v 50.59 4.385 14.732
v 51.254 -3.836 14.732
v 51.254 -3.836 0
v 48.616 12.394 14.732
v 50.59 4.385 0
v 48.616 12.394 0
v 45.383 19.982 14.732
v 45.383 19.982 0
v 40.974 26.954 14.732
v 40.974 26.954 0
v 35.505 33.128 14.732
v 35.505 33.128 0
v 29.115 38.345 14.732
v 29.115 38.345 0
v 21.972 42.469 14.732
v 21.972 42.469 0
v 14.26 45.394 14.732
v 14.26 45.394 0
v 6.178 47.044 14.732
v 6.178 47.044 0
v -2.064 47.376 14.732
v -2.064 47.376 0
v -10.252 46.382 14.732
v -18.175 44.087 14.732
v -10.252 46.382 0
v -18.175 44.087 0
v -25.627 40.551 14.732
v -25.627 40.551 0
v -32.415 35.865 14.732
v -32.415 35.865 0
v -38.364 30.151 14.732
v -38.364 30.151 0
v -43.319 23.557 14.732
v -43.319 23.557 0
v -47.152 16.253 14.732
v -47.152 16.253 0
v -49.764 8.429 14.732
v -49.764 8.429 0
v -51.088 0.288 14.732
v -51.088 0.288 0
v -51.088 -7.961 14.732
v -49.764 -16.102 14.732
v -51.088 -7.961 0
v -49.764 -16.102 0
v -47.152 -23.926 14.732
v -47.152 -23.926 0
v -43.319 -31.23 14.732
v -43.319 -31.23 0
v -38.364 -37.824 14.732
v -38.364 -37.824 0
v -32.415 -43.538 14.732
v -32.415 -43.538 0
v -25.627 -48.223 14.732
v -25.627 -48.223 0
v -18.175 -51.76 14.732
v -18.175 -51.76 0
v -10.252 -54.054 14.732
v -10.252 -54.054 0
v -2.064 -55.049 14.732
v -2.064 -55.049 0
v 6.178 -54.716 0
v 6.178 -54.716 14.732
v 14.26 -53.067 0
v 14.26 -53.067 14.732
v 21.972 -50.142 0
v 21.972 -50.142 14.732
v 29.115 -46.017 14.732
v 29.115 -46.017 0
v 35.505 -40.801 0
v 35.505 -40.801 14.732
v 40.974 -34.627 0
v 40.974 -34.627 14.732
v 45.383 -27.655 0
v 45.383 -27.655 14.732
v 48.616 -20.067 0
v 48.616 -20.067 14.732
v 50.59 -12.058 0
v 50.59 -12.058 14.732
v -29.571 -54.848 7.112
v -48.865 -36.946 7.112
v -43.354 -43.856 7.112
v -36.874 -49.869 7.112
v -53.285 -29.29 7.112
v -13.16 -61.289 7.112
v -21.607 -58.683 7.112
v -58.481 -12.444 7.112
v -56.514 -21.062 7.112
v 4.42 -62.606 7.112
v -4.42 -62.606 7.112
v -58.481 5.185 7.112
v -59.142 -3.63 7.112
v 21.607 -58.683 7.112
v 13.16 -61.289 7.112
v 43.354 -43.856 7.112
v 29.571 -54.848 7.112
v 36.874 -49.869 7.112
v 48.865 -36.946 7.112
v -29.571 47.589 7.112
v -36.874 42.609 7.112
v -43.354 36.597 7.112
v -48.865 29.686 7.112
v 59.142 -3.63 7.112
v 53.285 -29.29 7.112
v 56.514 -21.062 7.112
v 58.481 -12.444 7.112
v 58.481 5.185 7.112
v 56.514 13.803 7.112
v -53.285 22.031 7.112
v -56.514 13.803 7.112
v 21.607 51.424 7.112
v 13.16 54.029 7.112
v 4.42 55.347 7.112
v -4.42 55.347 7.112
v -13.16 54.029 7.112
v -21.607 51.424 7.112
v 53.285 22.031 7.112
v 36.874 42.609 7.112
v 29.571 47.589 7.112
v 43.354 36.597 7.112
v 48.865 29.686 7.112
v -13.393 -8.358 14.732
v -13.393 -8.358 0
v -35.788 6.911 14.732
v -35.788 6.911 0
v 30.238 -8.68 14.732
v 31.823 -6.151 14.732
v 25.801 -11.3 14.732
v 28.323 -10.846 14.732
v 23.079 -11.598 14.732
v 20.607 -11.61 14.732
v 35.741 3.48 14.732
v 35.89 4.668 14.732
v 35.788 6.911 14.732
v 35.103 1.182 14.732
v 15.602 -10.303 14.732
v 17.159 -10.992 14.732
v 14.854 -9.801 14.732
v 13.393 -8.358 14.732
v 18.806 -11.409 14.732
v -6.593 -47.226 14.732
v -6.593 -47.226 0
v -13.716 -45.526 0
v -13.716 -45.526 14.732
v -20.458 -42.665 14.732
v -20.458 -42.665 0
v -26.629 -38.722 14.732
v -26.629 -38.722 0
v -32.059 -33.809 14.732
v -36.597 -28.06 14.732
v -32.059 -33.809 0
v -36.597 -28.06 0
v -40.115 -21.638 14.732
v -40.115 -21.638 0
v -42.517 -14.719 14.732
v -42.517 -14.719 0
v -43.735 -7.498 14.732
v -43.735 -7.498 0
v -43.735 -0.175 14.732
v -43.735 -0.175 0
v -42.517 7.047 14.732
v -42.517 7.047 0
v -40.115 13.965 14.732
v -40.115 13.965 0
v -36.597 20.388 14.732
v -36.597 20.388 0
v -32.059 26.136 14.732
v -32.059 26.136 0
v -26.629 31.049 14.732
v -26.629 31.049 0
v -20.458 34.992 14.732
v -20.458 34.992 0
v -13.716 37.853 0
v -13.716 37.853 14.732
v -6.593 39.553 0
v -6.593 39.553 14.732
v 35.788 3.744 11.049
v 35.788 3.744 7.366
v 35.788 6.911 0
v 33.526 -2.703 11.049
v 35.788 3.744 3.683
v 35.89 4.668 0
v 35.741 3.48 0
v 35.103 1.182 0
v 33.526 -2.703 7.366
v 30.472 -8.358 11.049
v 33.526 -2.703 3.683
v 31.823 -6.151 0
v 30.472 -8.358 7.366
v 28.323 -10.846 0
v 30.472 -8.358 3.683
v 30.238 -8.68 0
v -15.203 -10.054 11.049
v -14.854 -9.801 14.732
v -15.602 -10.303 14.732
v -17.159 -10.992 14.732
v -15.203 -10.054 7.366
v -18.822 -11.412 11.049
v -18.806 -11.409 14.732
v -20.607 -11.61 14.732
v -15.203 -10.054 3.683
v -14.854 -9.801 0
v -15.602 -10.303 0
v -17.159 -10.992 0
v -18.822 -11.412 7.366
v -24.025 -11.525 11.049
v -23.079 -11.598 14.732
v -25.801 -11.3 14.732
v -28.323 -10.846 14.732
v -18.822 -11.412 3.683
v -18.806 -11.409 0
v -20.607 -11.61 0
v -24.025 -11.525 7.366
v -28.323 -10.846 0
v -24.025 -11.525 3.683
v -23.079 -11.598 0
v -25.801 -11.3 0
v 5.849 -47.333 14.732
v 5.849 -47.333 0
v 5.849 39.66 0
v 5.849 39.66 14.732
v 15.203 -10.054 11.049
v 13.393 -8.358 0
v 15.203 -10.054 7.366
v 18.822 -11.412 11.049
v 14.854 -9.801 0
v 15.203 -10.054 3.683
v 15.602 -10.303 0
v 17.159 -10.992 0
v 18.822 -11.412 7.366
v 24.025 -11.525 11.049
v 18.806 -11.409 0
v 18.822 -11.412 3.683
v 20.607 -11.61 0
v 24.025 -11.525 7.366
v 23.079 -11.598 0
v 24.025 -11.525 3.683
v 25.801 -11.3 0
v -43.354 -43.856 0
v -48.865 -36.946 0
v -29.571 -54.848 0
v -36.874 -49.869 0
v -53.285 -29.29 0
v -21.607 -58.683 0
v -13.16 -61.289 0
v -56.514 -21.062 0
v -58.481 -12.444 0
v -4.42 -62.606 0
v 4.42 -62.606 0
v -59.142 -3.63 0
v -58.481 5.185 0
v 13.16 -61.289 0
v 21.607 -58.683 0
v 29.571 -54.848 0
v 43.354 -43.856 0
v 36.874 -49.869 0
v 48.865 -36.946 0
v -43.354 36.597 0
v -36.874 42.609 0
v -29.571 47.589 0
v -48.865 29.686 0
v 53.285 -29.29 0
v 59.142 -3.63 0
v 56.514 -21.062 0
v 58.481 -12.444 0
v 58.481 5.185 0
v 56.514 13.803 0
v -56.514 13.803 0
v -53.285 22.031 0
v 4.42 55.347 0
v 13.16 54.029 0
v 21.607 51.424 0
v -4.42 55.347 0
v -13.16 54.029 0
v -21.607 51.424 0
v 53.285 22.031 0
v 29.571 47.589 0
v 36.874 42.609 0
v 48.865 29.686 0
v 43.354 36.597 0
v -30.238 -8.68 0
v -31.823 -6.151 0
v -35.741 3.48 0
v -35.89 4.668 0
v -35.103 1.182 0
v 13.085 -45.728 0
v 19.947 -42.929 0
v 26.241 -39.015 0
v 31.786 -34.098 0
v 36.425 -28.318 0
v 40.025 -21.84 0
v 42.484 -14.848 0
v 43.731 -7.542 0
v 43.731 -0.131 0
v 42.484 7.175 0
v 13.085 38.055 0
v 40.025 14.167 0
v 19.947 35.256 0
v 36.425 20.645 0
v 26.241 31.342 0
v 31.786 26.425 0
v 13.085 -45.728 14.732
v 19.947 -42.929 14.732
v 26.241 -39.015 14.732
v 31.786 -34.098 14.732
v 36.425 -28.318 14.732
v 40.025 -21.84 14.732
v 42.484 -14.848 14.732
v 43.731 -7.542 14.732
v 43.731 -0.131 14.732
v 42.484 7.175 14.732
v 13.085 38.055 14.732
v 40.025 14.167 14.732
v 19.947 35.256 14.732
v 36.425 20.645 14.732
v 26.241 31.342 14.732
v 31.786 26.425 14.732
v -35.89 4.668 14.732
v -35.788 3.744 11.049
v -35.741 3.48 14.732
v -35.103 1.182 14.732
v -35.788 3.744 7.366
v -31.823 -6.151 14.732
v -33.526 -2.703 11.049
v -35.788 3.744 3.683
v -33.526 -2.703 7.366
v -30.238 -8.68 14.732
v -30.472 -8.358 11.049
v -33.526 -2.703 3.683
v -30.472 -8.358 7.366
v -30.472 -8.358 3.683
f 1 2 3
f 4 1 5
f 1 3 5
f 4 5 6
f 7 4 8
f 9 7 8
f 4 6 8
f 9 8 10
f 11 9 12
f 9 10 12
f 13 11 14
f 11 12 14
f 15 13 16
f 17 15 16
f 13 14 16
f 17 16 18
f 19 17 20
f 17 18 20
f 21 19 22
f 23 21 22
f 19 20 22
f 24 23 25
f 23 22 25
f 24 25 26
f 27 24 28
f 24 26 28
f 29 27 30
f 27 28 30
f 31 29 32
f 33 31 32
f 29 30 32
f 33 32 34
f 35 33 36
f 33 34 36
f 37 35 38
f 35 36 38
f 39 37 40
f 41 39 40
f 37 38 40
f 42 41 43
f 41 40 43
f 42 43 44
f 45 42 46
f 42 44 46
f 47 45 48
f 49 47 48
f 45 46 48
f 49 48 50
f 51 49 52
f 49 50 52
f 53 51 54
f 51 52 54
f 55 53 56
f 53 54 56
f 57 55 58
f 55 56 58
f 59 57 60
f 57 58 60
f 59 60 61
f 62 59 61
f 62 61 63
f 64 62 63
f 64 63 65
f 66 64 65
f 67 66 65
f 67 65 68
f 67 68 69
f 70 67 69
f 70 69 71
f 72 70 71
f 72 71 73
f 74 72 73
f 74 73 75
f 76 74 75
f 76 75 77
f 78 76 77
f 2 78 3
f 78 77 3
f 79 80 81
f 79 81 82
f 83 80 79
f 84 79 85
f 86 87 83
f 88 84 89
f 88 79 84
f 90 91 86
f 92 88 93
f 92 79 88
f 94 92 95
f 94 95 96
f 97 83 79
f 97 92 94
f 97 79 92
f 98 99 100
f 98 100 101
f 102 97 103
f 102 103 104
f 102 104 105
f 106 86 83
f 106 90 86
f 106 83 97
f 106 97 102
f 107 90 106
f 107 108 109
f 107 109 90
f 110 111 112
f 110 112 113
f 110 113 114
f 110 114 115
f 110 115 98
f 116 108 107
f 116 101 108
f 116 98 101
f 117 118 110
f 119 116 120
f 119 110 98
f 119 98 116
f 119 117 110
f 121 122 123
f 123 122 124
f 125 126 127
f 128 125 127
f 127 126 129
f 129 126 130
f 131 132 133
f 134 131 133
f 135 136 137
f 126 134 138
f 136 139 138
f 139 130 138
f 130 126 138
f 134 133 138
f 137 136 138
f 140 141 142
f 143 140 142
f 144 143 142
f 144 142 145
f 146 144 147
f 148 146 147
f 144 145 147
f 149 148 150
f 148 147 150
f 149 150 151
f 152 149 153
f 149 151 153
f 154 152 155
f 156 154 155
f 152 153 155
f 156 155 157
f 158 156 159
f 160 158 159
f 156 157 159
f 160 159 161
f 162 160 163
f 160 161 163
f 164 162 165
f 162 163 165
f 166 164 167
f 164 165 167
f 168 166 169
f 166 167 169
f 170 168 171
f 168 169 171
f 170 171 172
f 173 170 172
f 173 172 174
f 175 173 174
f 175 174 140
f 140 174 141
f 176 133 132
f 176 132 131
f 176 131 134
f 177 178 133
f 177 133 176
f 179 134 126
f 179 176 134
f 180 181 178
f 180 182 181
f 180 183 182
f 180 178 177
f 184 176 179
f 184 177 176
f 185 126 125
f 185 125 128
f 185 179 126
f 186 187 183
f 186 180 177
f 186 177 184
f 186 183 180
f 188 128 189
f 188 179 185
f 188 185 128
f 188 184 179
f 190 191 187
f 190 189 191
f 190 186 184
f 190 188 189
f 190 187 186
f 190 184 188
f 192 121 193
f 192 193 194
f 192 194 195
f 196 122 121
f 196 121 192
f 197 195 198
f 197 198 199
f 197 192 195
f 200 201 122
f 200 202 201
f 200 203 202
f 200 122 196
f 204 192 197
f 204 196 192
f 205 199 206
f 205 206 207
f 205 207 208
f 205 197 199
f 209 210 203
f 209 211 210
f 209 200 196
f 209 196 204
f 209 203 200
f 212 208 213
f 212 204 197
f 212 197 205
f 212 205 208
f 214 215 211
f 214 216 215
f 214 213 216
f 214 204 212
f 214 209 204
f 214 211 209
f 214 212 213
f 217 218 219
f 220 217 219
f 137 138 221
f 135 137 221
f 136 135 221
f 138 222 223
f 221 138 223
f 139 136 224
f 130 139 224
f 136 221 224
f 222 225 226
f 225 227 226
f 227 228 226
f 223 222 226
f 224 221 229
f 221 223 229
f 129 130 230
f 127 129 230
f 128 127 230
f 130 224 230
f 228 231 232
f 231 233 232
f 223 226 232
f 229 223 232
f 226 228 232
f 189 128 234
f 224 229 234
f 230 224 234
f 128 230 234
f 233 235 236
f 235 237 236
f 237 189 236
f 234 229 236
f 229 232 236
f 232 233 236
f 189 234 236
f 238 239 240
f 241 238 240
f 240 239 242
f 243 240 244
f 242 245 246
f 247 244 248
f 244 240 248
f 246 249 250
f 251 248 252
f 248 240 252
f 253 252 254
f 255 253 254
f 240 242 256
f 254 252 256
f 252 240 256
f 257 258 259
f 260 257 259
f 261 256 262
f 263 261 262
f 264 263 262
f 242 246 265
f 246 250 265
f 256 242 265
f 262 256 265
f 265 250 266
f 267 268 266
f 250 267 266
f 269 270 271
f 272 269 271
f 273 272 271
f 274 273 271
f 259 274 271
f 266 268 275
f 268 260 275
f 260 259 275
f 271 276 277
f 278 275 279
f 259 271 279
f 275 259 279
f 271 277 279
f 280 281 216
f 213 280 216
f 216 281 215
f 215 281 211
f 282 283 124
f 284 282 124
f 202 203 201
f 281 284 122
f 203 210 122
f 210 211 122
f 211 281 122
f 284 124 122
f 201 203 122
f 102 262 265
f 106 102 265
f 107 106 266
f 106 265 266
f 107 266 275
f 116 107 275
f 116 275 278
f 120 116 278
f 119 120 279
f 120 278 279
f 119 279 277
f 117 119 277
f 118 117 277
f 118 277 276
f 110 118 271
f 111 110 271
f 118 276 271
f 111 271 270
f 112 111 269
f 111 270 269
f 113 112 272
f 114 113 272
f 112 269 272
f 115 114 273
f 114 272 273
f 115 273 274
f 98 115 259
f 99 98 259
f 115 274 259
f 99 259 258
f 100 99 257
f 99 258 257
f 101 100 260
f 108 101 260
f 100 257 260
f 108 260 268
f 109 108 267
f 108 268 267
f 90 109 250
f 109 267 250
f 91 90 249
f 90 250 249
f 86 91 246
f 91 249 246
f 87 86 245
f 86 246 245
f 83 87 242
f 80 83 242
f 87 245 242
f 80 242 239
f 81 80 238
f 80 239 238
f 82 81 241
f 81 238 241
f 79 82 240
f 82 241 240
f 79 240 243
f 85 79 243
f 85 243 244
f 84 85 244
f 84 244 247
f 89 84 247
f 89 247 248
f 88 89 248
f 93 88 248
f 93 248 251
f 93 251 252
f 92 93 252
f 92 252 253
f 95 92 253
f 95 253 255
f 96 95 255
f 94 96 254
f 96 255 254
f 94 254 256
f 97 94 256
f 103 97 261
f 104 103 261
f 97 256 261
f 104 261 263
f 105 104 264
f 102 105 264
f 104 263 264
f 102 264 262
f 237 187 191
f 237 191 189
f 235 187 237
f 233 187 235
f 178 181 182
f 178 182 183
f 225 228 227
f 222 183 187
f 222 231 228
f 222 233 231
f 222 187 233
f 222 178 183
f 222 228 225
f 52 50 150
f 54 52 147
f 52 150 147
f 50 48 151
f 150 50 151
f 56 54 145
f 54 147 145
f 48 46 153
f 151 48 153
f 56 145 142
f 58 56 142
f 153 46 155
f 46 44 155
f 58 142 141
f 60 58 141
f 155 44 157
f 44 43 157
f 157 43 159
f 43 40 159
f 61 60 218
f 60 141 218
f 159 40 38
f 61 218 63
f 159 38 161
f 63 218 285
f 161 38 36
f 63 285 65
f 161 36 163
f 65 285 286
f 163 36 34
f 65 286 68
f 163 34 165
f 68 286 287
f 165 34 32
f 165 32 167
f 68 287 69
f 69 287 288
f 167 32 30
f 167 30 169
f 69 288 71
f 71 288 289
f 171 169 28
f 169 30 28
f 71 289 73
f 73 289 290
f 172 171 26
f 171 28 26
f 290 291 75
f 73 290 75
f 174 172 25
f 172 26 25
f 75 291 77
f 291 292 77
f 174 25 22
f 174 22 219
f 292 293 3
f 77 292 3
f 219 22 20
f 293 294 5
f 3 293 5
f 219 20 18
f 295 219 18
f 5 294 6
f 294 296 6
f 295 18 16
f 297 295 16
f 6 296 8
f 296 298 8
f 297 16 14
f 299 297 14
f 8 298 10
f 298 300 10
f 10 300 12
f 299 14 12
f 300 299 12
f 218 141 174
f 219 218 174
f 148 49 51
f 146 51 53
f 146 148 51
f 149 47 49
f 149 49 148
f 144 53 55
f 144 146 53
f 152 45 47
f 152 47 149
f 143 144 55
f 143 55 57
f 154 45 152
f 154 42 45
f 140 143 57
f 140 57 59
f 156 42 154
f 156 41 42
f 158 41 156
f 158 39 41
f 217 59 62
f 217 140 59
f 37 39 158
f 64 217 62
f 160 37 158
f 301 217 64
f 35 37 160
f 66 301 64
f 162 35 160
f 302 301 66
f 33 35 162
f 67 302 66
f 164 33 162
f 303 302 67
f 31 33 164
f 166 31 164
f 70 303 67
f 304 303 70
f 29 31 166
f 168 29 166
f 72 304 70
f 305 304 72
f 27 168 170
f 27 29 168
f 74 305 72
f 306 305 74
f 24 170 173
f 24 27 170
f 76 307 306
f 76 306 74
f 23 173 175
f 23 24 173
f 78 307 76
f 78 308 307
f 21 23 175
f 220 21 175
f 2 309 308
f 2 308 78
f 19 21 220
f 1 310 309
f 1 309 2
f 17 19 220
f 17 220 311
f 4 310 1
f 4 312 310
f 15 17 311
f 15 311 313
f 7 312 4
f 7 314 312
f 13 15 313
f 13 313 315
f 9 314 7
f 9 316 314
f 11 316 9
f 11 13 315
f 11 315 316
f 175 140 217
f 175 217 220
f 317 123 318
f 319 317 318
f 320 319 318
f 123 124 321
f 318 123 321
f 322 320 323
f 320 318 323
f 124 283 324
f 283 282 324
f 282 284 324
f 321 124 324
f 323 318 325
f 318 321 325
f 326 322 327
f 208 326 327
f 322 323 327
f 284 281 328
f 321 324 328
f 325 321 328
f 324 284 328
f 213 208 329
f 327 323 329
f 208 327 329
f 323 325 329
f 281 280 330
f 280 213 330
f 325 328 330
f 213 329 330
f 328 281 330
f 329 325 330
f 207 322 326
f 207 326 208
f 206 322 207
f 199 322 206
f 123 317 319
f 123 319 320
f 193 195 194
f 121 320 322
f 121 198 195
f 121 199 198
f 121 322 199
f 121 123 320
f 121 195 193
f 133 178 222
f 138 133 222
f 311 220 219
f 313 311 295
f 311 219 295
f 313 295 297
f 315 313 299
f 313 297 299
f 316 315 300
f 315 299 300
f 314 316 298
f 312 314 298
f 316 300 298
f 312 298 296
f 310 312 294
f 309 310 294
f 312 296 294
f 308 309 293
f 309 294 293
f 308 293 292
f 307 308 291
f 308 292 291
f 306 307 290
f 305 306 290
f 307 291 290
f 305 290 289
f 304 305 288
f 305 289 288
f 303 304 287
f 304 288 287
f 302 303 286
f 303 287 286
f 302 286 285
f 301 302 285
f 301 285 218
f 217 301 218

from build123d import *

# Parameters (mm, degrees)
F0_R     = 51.2537838732
F2_DEPTH = 14.732
F1_R     = 59.1419906028
F3_DEPTH = 7.112


with BuildPart() as f2:
    # F0 (on Top) → F2 (new body)
    with BuildSketch(Plane.XY):
        with Locations((0, -3.8363970816)):
            Circle(F0_R)
        with BuildLine():
            ThreePointArc((-6.5931694195, -47.2261147551), (-43.8877828419, -3.8363970816), (-6.5931694195, 39.5533205919))
            Line((-6.5931694195, 39.5533205919), (-6.5931694195, -47.2261147551))
        make_face(mode=Mode.SUBTRACT)
        with BuildLine():
            ThreePointArc((5.8489358233, 39.6598950881), (43.8877828419, -3.8363970816), (5.8489358233, -47.3326892513))
            Line((5.8489358233, -47.3326892513), (5.8489358233, 39.6598950881))
        make_face(mode=Mode.SUBTRACT)
    extrude(amount=F2_DEPTH)


with BuildPart() as f2b:
    # F0 (on Top) → F2, piece 2 (new body)
    with BuildSketch(Plane.XY):
        with BuildLine():
            Line((-13.3933164179, -8.3579476923), (-35.7876867056, 6.9109406322))
            add(Edge.make_bspline(
                [(-35.7876867056, 6.9109406322), (-35.8885303002, 5.9446186695), (-36.1374935987, 3.55895695), (-33.6221832865, -2.778508824), (-30.7379331001, -8.3718347435), (-29.0335883276, -10.1180562035), (-28.3228959888, -10.8462106436)],
                knots=[0, 0, 0, 0, 0.2035706864, 0.5025765869, 0.7925801079, 1, 1, 1, 1], degree=3))
            add(Edge.make_bspline(
                [(-13.3933164179, -8.3579476923), (-13.9252826145, -8.9550350444), (-15.1213105705, -10.2974759175), (-18.8643967054, -11.7174972903), (-24.0526727861, -11.6692015296), (-26.9425620363, -11.1122394221), (-28.3228959888, -10.8462106436)],
                knots=[0, 0, 0, 0, 0.1991569999, 0.4477678113, 0.7362304318, 1, 1, 1, 1], degree=3))
        make_face()
    extrude(amount=F2_DEPTH)


with BuildPart() as f2c:
    # F0 (on Top) → F2, piece 3 (new body)
    with BuildSketch(Plane.XY):
        with BuildLine():
            add(Edge.make_bspline(
                [(35.7876867056, 6.9109406322), (35.8885303002, 5.9446186695), (36.1374935987, 3.55895695), (33.6221832865, -2.778508824), (30.7379331001, -8.3718347435), (29.0335883276, -10.1180562035), (28.3228959888, -10.8462106436)],
                knots=[0, 0, 0, 0, 0.2035706864, 0.5025765869, 0.7925801079, 1, 1, 1, 1], degree=3))
            Line((35.7876867056, 6.9109406322), (13.3933164179, -8.3579476923))
            add(Edge.make_bspline(
                [(13.3933164179, -8.3579476923), (13.9252826145, -8.9550350444), (15.1213105705, -10.2974759175), (18.8643967054, -11.7174972903), (24.0526727861, -11.6692015296), (26.9425620363, -11.1122394221), (28.3228959888, -10.8462106436)],
                knots=[0, 0, 0, 0, 0.1991569999, 0.4477678113, 0.7362304318, 1, 1, 1, 1], degree=3))
        make_face()
    extrude(amount=F2_DEPTH)


with BuildPart() as f3:
    # F1 (on Top) → F3 (new body)
    with BuildSketch(Plane.XY):
        with Locations((0, -3.6296788603)):
            Circle(F1_R)
    extrude(amount=F3_DEPTH)


solid = Compound([f2.part, f2b.part, f2c.part, f3.part])
